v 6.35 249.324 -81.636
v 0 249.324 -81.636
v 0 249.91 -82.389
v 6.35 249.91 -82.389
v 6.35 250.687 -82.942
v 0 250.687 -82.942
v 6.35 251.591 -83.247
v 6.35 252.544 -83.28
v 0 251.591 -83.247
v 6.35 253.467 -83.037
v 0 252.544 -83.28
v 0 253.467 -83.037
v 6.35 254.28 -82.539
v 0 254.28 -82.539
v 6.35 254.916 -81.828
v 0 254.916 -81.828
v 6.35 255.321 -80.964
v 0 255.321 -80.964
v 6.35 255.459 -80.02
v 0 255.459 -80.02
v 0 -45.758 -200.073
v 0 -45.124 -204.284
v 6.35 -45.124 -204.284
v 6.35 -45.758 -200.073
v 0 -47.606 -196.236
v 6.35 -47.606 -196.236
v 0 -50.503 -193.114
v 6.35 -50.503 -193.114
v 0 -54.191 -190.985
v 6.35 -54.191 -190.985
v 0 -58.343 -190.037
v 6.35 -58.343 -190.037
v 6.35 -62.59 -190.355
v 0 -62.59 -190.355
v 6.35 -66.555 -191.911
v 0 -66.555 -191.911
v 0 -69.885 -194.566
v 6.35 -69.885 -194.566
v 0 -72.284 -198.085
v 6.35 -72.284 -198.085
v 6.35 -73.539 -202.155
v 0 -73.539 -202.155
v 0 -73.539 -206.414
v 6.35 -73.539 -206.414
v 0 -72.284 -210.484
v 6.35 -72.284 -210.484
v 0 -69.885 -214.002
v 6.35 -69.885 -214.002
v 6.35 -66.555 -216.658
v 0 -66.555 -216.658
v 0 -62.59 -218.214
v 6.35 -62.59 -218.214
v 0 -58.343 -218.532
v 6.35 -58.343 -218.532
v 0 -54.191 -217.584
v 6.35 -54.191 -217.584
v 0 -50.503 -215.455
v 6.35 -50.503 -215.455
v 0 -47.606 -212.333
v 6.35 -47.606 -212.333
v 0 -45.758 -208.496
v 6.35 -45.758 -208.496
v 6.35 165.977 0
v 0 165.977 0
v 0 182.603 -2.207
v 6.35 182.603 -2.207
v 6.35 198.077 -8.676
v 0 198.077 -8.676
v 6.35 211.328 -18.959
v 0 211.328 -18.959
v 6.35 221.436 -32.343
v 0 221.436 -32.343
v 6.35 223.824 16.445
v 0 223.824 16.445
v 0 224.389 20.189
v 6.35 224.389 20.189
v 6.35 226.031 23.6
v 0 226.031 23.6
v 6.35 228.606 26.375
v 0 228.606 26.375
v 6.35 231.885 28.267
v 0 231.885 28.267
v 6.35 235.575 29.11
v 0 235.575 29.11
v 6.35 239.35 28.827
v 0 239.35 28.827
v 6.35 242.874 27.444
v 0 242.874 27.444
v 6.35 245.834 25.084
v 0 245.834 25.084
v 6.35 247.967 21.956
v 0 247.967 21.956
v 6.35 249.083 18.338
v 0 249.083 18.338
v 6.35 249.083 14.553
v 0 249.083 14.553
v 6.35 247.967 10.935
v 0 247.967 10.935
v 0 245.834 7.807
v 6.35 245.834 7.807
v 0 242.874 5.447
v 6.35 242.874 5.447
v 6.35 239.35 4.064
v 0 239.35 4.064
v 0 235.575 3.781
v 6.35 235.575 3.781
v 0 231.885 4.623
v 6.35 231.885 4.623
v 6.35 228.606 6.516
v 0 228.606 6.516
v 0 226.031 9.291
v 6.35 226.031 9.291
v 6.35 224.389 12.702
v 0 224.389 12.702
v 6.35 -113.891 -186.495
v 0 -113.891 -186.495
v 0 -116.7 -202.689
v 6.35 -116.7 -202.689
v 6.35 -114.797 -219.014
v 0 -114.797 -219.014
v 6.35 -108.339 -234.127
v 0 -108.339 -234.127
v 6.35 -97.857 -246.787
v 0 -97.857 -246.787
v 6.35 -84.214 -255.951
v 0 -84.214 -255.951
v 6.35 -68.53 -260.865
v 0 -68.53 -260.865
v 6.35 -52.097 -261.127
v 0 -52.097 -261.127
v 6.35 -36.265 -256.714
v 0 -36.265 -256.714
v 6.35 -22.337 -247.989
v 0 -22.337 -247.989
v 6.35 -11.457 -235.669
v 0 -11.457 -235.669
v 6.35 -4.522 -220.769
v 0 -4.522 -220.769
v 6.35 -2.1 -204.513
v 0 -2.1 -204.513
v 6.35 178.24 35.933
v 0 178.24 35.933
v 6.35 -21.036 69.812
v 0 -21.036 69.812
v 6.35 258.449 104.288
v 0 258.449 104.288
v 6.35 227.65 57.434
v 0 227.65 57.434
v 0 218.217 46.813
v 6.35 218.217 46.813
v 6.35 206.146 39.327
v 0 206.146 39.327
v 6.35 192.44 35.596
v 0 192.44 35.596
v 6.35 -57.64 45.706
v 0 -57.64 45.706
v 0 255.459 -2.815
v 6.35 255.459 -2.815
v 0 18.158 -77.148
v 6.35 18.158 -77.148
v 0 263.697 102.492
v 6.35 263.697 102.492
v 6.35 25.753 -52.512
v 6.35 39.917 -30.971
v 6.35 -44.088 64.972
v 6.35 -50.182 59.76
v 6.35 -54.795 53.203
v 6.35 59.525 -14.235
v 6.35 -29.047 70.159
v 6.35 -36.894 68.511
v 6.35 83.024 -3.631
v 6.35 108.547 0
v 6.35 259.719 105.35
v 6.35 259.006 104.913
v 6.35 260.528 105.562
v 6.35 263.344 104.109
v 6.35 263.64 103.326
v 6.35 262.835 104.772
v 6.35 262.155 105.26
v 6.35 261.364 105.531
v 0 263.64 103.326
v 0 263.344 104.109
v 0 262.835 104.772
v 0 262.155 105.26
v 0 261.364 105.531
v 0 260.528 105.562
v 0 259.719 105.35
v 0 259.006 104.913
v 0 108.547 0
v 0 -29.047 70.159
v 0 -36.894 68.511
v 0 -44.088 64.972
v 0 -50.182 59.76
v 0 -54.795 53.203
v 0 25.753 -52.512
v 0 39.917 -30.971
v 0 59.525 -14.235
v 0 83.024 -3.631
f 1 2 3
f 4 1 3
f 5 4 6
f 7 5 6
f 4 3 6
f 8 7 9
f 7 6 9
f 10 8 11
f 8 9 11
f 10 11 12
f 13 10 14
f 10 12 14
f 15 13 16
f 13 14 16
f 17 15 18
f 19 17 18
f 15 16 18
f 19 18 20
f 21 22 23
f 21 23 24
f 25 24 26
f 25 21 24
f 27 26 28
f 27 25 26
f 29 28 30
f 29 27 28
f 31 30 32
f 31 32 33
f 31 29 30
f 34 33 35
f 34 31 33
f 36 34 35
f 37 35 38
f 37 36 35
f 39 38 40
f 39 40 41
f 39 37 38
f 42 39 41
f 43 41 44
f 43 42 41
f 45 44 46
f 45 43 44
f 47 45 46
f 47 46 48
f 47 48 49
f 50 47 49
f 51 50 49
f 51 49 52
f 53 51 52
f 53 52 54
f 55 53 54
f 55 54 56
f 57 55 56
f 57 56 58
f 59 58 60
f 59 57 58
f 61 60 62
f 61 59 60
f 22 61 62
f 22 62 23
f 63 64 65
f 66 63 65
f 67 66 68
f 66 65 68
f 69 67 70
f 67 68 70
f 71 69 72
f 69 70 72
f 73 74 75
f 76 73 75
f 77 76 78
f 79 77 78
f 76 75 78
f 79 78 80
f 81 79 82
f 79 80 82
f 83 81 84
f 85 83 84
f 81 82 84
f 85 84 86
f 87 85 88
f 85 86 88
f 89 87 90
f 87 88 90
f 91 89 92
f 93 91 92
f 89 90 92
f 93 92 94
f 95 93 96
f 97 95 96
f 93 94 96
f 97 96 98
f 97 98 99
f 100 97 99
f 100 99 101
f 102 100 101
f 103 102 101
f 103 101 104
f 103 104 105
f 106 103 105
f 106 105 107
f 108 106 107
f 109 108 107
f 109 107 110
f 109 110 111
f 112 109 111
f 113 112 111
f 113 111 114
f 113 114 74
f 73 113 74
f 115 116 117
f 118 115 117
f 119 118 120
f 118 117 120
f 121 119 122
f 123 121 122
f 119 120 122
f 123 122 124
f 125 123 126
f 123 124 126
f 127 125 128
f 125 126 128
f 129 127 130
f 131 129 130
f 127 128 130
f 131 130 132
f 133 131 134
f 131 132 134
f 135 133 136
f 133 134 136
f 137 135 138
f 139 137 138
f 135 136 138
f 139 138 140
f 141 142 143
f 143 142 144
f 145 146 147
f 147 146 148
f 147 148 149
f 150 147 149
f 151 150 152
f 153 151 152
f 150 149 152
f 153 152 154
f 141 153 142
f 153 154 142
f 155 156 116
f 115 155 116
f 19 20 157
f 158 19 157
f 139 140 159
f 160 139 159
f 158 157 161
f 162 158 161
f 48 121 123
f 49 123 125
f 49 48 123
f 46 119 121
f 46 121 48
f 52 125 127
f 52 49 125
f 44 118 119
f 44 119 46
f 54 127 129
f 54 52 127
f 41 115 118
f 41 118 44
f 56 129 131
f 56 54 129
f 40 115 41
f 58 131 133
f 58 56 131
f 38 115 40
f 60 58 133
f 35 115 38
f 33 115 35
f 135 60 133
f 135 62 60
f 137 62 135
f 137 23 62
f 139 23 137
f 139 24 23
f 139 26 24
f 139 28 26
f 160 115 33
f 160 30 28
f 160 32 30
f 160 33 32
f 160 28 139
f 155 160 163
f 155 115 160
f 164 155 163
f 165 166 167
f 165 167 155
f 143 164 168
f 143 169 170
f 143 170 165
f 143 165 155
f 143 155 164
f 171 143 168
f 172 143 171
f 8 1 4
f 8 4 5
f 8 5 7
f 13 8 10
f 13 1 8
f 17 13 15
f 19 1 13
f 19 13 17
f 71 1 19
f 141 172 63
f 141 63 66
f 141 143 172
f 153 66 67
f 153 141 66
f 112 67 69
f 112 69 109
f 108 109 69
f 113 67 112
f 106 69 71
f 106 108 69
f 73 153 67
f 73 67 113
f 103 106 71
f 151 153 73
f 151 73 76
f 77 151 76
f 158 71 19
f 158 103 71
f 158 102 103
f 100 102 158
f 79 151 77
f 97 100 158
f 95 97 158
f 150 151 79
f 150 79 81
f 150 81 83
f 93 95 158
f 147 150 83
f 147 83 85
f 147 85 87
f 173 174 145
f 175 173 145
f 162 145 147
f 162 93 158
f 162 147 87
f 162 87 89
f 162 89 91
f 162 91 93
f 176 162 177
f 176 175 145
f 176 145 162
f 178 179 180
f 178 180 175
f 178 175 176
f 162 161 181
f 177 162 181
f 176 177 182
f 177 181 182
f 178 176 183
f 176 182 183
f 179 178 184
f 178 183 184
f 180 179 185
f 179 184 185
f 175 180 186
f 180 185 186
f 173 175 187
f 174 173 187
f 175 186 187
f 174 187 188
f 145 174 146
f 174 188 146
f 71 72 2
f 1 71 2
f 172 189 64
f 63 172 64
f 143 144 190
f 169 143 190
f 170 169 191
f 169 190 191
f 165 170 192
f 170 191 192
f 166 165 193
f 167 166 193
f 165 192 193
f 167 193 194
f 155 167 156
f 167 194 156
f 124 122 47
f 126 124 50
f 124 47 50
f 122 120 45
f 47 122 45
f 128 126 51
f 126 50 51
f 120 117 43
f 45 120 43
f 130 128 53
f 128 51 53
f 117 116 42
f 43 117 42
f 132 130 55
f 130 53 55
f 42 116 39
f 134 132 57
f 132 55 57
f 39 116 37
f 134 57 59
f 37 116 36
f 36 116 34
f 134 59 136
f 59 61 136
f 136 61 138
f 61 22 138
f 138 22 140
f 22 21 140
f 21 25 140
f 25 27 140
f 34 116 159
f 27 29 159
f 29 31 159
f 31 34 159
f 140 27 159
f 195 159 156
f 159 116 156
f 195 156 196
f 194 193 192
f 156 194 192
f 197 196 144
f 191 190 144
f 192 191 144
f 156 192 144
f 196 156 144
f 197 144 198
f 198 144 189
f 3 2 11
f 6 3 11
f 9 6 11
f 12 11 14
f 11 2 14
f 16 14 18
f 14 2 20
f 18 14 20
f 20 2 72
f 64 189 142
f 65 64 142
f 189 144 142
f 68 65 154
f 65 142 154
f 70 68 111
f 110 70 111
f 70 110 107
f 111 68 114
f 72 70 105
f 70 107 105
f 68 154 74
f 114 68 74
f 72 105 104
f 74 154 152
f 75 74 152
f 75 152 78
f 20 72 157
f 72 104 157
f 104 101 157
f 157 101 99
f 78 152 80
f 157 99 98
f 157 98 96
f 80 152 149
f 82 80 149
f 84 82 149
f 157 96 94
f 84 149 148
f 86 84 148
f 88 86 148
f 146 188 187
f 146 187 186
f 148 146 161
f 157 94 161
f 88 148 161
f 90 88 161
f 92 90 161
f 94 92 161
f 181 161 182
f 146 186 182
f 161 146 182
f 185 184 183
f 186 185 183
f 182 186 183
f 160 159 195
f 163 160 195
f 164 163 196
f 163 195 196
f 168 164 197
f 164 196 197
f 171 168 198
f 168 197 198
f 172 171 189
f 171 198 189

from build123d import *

# Parameters (mm, degrees)
F1_DEPTH = 6.35
F2_DEPTH = 6.35
F4_D     = 25.4
F0_R     = 14.2875
F5_DEPTH = 6.35


with BuildPart() as f1:
    # F0 (on Right) → F1 (new body)
    with BuildSketch(Plane.YZ):
        with BuildLine():
            ThreePointArc((-2.099991, -204.28443), (-2.100104, -204.39856), (-2.100445, -204.512689))
            Line((-2.100445, -204.512689), (18.158056, -77.147721))
            ThreePointArc((18.158056, -77.147721), (49.128885, -21.909255), (108.5466, 0))
            Line((108.5466, 0), (165.976715, 0))
            ThreePointArc((165.976715, 0), (198.077363, -8.676495), (221.435985, -32.343096))
            Line((221.435985, -32.343096), (249.324016, -81.635659))
            ThreePointArc((249.324016, -81.635659), (253.014213, -83.19258), (255.459351, -80.020378))
            Line((255.459351, -80.020378), (255.459351, -2.815202))
            Line((255.459351, -2.815202), (263.697012, 102.492085))
            ThreePointArc((263.697012, 102.492085), (261.769548, 105.424616), (258.449354, 104.288324))
            Line((258.449354, 104.288324), (227.64977, 57.433632))
            ThreePointArc((227.64977, 57.433632), (206.146196, 39.32667), (178.240132, 35.932943))
            Line((178.240132, 35.932943), (-21.036066, 69.812165))
            ThreePointArc((-21.036066, 69.812165), (-44.087909, 64.971566), (-57.640454, 45.706379))
            Line((-57.640454, 45.706379), (-113.891336, -186.494963))
            ThreePointArc((-113.891336, -186.494963), (-50.404443, -147.685468), (-2.099991, -204.28443))
        make_face()
    extrude(amount=F1_DEPTH)

    # F0 (on Right) → F2 (join)
    with BuildSketch(Plane.YZ):
        with BuildLine():
            ThreePointArc((-2.099991, -204.28443), (-2.100104, -204.39856), (-2.100445, -204.512689))
            Line((-2.100445, -204.512689), (18.158056, -77.147721))
            ThreePointArc((18.158056, -77.147721), (49.128885, -21.909255), (108.5466, 0))
            Line((108.5466, 0), (165.976715, 0))
            ThreePointArc((165.976715, 0), (198.077363, -8.676495), (221.435985, -32.343096))
            Line((221.435985, -32.343096), (249.324016, -81.635659))
            ThreePointArc((249.324016, -81.635659), (253.014213, -83.19258), (255.459351, -80.020378))
            Line((255.459351, -80.020378), (255.459351, -2.815202))
            Line((255.459351, -2.815202), (263.697012, 102.492085))
            ThreePointArc((263.697012, 102.492085), (261.769548, 105.424616), (258.449354, 104.288324))
            Line((258.449354, 104.288324), (227.64977, 57.433632))
            ThreePointArc((227.64977, 57.433632), (206.146196, 39.32667), (178.240132, 35.932943))
            Line((178.240132, 35.932943), (-21.036066, 69.812165))
            ThreePointArc((-21.036066, 69.812165), (-44.087909, 64.971566), (-57.640454, 45.706379))
            Line((-57.640454, 45.706379), (-113.891336, -186.494963))
            ThreePointArc((-113.891336, -186.494963), (-50.404443, -147.685468), (-2.099991, -204.28443))
        make_face()
    extrude(amount=F2_DEPTH)

    # F4 (through all)
    with Locations(Plane.YZ.offset(6.35)):
        with Locations((236.524433, 16.445378)):
            Hole(F4_D / 2)

    # F0 (on Right) → F5 (join)
    with BuildSketch(Plane.YZ):
        with BuildLine():
            ThreePointArc((-113.891336, -186.494963), (-68.530434, -260.865344), (-2.100445, -204.512689))
            ThreePointArc((-2.100445, -204.512689), (-2.100104, -204.39856), (-2.099991, -204.28443))
            ThreePointArc((-2.099991, -204.28443), (-50.404443, -147.685468), (-113.891336, -186.494963))
        make_face()
        with Locations((-59.411091, -204.28443)):
            Circle(F0_R, mode=Mode.SUBTRACT)
    extrude(amount=F5_DEPTH)


solid = f1.part
